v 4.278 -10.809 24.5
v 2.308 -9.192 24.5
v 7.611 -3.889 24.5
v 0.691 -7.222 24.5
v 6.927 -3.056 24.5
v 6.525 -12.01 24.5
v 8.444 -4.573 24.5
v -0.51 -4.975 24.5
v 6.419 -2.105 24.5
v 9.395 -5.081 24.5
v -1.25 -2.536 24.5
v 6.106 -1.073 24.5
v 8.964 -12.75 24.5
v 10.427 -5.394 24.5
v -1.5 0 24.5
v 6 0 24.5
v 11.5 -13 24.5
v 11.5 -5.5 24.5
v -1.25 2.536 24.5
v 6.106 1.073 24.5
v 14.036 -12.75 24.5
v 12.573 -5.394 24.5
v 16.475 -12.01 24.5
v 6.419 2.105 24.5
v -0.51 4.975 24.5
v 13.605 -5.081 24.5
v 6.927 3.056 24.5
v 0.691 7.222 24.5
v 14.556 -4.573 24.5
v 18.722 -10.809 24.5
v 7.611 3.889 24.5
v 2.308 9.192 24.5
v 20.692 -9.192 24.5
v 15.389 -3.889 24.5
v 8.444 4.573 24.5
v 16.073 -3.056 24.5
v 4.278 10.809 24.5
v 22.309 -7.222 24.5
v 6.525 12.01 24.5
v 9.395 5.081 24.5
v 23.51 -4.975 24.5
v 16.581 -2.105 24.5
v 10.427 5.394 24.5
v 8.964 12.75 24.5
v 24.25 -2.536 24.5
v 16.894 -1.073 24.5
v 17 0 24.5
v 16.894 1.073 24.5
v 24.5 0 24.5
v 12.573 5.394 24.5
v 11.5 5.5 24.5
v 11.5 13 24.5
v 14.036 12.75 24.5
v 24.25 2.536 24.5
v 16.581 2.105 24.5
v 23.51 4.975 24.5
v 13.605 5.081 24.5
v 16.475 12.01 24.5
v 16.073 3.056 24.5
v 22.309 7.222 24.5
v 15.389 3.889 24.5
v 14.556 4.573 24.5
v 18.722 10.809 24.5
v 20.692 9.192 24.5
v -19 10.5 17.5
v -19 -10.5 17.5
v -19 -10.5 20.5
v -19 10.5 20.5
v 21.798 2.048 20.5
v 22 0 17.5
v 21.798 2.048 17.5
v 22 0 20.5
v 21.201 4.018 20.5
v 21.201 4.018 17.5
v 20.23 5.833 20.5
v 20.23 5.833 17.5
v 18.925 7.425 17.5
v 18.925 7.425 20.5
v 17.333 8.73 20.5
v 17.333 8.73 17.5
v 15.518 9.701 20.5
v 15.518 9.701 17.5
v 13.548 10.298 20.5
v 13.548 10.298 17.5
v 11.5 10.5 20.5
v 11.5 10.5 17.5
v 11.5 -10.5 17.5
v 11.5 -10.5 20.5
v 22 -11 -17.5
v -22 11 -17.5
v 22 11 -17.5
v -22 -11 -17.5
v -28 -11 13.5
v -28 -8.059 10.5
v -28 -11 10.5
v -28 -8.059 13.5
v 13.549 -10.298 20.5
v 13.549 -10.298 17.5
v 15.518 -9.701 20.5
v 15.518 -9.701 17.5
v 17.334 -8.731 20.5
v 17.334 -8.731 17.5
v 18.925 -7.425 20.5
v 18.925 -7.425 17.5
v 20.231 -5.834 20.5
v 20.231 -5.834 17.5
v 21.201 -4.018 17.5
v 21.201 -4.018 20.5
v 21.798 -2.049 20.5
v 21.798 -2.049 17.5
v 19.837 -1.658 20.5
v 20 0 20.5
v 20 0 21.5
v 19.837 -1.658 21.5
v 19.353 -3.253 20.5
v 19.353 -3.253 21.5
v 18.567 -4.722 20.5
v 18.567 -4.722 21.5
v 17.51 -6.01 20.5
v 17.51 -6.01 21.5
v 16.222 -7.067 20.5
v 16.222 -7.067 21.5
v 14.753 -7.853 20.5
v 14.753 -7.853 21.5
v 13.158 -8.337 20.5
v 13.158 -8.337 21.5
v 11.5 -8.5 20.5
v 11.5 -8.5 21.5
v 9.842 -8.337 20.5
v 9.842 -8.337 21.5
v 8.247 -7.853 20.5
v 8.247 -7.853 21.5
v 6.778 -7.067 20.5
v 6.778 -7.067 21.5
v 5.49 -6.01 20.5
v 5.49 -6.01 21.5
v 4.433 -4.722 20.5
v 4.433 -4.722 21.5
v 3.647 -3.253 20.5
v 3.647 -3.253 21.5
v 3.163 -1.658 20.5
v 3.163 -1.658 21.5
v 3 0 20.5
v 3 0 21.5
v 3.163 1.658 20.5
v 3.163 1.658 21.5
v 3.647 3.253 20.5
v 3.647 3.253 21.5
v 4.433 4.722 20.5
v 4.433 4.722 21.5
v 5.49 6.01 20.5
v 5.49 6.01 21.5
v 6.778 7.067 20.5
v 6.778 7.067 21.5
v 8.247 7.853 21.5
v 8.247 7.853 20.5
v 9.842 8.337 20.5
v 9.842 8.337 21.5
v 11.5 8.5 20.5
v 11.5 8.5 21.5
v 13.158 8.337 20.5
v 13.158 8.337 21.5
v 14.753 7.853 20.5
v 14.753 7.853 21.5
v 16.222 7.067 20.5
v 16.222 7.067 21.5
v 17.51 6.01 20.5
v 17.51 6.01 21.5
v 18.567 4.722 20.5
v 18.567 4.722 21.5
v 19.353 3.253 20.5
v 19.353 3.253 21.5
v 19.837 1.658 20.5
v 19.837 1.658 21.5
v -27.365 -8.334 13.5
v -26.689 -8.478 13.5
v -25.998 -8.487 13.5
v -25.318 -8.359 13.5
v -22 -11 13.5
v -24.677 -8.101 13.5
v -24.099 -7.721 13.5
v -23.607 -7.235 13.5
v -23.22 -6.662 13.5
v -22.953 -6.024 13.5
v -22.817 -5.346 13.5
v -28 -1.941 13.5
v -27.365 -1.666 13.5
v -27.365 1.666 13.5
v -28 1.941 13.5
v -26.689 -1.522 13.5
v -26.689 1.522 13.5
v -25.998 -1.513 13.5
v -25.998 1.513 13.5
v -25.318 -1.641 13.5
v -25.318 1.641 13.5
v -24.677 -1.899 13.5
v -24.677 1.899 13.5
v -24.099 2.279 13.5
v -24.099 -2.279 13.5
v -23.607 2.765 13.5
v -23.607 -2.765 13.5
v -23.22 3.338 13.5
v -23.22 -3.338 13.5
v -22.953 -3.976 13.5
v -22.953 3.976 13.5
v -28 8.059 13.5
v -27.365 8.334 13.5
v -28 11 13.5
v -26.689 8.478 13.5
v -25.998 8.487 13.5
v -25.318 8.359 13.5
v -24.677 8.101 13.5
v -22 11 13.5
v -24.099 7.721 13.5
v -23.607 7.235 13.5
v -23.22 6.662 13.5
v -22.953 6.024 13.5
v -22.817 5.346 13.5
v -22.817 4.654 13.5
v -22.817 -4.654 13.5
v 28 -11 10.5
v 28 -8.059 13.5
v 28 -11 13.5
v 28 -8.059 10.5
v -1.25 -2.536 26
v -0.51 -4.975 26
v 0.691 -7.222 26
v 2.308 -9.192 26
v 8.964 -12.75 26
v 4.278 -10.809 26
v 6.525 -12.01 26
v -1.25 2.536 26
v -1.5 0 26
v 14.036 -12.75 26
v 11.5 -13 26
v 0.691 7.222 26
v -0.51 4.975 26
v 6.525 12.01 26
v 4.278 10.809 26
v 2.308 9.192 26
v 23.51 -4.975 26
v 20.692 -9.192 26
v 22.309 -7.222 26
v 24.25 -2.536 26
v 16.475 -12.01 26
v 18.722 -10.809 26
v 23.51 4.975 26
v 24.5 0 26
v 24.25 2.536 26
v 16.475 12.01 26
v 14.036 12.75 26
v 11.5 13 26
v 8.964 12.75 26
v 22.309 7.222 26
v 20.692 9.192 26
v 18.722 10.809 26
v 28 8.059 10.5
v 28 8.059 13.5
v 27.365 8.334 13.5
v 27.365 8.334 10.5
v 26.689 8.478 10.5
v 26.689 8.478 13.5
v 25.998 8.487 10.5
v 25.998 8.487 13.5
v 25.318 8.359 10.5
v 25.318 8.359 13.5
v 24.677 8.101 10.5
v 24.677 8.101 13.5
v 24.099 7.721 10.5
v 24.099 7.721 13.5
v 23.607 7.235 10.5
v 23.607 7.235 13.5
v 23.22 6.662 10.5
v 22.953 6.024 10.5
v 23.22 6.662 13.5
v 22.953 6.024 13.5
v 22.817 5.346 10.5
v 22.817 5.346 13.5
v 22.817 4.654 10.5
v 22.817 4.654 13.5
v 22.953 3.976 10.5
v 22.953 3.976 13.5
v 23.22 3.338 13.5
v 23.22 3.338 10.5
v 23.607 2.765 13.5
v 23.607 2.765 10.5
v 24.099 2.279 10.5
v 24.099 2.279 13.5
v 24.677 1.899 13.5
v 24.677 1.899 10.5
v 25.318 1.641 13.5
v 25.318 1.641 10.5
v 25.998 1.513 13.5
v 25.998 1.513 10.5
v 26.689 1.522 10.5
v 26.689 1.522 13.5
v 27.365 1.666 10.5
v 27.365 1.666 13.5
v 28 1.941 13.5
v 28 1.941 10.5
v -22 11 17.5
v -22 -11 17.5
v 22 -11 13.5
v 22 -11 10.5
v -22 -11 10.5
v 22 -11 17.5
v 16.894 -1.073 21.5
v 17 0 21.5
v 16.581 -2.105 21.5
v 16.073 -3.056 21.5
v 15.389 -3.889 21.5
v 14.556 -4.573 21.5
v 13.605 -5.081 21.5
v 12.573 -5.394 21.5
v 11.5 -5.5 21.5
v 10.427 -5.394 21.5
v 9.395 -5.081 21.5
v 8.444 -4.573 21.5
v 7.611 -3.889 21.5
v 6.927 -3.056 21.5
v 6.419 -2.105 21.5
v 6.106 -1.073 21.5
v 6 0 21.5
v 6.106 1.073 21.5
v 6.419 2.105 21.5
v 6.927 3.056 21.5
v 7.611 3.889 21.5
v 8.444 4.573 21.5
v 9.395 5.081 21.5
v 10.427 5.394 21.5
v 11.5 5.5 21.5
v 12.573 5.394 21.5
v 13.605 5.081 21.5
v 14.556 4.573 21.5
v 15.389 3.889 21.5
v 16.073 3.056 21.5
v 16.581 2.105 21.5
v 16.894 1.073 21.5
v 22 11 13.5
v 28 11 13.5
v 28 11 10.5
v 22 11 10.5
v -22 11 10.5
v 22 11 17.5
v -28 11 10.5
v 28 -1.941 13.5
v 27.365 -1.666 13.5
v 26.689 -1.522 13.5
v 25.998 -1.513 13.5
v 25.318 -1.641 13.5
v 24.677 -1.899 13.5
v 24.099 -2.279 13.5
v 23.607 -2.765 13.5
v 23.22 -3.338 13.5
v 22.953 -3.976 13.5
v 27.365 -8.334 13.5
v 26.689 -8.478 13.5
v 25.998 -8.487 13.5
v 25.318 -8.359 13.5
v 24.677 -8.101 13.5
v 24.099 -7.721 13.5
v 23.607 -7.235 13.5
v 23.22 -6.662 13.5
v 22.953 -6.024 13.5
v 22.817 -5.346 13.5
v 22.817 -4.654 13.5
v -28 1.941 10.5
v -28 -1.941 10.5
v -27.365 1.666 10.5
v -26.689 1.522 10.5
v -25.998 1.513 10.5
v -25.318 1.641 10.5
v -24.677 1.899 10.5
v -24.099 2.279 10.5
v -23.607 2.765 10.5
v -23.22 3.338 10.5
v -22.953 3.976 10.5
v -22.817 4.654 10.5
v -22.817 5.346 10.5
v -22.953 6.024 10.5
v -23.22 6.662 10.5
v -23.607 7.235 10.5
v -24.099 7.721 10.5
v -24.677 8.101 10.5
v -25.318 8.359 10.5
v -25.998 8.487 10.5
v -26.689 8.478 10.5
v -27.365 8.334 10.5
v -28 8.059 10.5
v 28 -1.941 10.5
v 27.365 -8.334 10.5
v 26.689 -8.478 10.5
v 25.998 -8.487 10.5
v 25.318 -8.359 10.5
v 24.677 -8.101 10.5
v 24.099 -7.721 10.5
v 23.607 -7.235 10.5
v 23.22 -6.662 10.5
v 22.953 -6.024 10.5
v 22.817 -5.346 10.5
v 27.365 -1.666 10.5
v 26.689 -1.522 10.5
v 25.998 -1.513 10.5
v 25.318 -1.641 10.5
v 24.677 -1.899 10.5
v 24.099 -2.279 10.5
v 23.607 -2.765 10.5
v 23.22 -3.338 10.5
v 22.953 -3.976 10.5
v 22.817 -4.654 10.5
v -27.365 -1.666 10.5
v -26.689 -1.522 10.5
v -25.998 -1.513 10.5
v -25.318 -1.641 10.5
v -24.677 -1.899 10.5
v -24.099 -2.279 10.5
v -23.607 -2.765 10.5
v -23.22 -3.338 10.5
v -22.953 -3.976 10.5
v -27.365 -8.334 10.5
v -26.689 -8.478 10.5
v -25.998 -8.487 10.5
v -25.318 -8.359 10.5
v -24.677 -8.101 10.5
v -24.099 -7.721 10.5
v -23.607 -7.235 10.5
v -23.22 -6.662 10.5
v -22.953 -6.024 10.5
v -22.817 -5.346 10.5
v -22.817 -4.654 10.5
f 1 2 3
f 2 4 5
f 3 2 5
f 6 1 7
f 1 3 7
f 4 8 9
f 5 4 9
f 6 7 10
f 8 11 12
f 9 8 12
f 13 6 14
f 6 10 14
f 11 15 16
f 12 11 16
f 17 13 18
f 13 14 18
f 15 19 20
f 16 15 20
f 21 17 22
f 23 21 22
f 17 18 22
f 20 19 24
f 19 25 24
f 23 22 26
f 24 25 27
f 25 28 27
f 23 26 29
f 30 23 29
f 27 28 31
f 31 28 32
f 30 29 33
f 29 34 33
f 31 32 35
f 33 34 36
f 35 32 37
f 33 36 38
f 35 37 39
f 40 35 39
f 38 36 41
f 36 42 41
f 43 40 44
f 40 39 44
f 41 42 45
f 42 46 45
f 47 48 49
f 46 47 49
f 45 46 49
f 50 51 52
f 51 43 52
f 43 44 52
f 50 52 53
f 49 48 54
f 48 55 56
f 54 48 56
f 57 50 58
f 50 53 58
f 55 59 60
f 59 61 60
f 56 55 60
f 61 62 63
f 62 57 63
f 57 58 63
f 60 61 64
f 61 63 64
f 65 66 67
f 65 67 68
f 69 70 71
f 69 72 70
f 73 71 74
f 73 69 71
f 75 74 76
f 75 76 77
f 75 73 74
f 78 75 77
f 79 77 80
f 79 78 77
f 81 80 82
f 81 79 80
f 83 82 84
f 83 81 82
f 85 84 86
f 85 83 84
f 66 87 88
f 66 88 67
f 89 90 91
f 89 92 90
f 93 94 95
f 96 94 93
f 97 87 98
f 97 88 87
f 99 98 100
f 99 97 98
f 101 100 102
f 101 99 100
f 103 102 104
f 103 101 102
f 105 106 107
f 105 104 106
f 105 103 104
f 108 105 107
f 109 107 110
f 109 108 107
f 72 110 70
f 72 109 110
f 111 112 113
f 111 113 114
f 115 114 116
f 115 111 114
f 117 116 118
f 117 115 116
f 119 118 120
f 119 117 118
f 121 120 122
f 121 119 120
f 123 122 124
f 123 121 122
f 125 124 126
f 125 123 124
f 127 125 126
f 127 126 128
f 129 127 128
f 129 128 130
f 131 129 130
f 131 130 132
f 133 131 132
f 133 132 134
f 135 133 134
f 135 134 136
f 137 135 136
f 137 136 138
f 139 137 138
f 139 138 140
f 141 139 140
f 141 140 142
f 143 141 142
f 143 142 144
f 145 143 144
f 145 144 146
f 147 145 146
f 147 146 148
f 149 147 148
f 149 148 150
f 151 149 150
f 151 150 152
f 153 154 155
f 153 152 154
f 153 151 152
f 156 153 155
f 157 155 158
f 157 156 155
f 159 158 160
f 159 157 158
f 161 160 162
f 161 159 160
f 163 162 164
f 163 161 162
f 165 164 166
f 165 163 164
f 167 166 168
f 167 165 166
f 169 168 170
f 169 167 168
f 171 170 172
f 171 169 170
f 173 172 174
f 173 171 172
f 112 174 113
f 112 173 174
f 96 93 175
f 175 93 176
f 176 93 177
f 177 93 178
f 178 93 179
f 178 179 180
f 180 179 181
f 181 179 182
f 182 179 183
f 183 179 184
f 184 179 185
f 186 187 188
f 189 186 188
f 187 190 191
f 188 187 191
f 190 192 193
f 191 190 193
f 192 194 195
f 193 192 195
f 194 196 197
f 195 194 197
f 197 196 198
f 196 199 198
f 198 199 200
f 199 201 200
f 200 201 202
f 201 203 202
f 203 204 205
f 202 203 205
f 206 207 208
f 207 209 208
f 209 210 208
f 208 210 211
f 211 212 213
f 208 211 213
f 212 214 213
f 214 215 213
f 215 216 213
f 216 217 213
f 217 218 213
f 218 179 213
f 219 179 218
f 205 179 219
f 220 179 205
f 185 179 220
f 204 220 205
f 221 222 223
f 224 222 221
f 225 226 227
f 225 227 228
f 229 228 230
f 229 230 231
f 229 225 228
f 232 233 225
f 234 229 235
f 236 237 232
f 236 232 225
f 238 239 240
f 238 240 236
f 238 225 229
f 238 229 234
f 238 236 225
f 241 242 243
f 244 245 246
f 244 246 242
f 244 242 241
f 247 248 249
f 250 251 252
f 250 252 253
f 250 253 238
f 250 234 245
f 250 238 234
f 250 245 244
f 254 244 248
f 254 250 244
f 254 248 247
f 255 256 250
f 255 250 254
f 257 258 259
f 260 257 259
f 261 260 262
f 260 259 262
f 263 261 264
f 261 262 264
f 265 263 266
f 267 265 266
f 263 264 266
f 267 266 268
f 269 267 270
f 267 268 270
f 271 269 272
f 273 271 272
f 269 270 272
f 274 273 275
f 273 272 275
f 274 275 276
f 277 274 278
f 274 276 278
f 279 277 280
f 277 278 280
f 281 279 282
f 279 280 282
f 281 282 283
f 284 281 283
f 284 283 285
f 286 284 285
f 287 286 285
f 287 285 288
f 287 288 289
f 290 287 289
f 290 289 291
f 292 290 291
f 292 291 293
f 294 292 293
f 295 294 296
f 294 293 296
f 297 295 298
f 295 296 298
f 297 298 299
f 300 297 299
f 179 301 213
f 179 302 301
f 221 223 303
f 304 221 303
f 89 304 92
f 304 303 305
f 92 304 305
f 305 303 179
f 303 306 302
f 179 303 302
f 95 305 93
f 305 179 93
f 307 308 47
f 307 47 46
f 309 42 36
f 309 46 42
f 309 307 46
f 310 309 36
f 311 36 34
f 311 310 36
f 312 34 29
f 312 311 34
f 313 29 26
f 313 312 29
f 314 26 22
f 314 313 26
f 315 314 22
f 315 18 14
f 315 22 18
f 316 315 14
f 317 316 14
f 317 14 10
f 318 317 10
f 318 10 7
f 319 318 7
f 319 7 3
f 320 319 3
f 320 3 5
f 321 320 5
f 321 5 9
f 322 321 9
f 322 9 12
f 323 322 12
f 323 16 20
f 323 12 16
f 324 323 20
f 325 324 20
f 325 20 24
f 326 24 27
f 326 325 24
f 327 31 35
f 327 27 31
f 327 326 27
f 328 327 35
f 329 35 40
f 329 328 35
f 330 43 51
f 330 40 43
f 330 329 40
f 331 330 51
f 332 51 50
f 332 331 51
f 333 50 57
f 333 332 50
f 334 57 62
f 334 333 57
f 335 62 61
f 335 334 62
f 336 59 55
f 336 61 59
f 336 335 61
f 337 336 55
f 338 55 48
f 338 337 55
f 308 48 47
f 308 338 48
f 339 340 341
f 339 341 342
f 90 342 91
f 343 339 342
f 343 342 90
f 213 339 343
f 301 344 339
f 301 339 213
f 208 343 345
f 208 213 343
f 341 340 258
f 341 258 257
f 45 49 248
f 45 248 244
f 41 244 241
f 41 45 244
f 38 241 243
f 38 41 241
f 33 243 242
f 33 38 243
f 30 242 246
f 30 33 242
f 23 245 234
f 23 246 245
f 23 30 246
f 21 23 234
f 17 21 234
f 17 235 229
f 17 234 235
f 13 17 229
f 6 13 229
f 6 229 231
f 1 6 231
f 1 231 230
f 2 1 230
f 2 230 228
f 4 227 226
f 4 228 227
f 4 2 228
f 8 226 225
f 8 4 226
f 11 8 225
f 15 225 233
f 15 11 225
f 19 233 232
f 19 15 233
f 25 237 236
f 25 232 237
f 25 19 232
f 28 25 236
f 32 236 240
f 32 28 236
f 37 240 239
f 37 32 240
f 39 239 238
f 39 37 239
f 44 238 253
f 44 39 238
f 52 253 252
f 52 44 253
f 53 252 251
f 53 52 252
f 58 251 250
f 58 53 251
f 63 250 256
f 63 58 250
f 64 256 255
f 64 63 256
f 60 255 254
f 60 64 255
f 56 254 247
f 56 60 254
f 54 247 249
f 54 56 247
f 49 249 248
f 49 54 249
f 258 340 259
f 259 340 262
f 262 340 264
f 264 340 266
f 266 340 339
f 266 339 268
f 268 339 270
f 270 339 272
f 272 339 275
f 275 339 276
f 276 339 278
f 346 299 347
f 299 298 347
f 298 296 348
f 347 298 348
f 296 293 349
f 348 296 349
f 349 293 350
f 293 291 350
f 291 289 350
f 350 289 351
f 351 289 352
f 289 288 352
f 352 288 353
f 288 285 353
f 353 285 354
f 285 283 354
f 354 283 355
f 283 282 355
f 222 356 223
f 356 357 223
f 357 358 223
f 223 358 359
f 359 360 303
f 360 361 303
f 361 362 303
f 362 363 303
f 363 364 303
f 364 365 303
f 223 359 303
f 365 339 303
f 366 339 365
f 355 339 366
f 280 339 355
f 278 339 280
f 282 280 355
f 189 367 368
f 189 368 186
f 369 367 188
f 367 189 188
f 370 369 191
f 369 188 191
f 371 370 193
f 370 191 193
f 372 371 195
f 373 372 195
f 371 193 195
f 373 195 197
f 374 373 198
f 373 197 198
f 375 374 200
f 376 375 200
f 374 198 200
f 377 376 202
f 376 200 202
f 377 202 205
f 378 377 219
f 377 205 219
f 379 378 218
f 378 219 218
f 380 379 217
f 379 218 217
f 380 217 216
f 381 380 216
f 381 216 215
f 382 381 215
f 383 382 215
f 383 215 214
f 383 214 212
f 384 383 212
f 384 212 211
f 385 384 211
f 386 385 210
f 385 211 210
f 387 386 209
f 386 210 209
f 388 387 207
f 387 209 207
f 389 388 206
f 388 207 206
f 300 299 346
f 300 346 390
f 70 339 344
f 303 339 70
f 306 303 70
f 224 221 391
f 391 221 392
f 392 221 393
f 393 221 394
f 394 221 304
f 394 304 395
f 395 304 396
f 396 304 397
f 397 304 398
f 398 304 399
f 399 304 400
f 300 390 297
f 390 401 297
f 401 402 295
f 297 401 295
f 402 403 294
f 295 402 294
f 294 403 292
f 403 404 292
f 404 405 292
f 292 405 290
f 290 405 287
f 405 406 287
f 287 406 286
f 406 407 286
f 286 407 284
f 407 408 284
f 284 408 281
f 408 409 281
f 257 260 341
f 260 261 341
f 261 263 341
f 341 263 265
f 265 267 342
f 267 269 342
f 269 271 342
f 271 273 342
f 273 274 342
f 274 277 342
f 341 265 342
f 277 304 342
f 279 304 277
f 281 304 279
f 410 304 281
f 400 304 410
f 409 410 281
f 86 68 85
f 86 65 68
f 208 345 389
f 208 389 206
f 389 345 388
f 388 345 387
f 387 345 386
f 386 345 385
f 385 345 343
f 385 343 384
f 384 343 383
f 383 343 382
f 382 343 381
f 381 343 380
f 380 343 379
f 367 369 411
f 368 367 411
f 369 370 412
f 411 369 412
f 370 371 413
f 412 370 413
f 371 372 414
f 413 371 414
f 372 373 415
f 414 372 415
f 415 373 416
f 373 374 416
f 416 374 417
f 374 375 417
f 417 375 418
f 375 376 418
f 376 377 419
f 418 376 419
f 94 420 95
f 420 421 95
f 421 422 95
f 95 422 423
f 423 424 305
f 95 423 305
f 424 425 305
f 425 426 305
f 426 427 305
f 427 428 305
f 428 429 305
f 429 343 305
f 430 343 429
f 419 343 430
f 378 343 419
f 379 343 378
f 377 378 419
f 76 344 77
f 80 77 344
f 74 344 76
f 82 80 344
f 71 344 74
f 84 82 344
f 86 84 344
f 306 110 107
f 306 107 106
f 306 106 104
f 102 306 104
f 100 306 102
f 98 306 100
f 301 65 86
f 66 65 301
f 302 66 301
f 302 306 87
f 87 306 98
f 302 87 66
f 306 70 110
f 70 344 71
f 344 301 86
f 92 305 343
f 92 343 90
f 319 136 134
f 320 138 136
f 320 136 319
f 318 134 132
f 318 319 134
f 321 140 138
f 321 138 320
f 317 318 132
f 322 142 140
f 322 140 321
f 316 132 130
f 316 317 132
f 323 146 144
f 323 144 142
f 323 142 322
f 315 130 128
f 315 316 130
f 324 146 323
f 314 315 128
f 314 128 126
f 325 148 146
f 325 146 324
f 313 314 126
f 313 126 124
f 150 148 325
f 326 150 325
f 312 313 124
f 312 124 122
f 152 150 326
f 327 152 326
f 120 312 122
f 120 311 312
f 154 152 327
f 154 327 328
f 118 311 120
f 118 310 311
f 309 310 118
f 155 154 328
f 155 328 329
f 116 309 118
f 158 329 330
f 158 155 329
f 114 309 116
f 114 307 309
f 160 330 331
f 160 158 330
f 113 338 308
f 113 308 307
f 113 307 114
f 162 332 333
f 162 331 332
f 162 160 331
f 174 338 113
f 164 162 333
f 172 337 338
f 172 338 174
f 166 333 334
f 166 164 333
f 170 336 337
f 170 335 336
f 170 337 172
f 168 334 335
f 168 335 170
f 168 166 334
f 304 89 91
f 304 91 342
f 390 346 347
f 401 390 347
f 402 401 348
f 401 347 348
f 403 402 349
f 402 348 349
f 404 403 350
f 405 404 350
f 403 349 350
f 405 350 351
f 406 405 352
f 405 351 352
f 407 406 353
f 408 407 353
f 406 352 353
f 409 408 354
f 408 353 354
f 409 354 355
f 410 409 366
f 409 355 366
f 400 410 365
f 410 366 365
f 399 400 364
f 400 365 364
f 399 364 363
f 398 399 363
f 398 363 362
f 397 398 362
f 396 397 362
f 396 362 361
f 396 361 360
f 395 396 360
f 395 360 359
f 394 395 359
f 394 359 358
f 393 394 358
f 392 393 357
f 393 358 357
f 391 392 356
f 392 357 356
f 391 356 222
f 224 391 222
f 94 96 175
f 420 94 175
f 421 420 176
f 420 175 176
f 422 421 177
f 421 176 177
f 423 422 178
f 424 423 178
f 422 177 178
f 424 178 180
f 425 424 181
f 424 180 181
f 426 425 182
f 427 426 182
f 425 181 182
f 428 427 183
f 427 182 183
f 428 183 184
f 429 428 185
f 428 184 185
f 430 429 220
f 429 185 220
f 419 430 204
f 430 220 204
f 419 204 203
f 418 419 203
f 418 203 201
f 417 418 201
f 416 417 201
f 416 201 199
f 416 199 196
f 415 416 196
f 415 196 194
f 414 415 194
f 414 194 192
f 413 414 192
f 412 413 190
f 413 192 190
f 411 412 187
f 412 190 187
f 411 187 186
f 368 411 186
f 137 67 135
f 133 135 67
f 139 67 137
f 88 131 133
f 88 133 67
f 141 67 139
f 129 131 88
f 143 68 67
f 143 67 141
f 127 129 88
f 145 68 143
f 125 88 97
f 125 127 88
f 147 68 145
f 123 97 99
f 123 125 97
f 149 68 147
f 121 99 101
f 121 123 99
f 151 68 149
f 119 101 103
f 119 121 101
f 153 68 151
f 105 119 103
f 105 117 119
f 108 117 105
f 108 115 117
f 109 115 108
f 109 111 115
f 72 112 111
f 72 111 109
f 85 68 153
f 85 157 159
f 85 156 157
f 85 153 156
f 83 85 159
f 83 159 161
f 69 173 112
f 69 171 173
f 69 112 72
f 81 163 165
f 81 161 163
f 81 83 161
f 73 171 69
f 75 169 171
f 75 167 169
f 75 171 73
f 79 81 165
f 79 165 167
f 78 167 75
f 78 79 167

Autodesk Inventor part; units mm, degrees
ref_plane "YZ Plane" through (0, 0, 0) normal (1, 0, 0) x (0, 1, 0)
ref_plane "XZ Plane" through (0, 0, 0) normal (0, 1, 0) x (-1, 0, 0)
ref_plane "XY Plane" through (0, 0, 0) normal (0, 0, 1) x (1, 0, 0)
sketch "Sketch1" plane through (0, 0, 0) normal (0, 1, 0) x (-1, 0, 0)
  line L0 (-22, 17.5) -> (22, 17.5)
  line L1 (22, 17.5) -> (22, -17.5)
  line L2 (22, -17.5) -> (-22, -17.5)
  line L3 (-22, -17.5) -> (-22, 17.5)
  line L4 (-22, 17.5) -> (22, -17.5) construction
  line L5 (22, 17.5) -> (-22, -17.5) construction
  point P0 (0, 0)
  dimension "d0" = 44
  dimension "d1" = 35
extrude "Extrusion1" add sketch "Sketch1" along normal mid plane 22
sketch "Sketch2" plane through (-22, 11, 17.5) normal (0, 0, 1) x (1, 0, 0)
  line L0 (3, -0.5) -> (44, -0.5)
  line L1 (44, -0.5) -> (44, -21.5)
  line L2 (44, -21.5) -> (3, -21.5)
  line L3 (3, -21.5) -> (3, -0.5)
  line L4 (0, 0) -> (0, -22) projected
  line L5 (44, 0) -> (0, 0) projected
  line L6 (0, -22) -> (44, -22) projected
  line L7 (44, 0) -> (44, -22) projected
  point P0 (22, -11)
  dimension "d4" = 3
  dimension "d5" = 0.5
  dimension "d6" = 0.5
  dimension "d7" = 0
extrude "Extrusion2" add sketch "Sketch2" along normal blind 3 contours L0 L1 L2 L3
fillet "Fillet1" radius 10.5 1 edges at (22, 10.5, 19)
fillet "Fillet2" radius 10.5 1 edges at (22, -10.5, 19)
sketch "Sketch3" plane through (-22, 11, 20.5) normal (0, 0, 1) x (1, 0, 0)
  circle A0 centre (33.5, -11) radius 8.5
  arc A1 (33.5, -21.5) -> (33.5, -0.5) centre (33.5, -11) ccw projected
  point P0 (22, -11)
  dimension "d13" = 2
extrude "Extrusion3" add sketch "Sketch3" along normal blind 1
sketch "Sketch4" plane through (11.5, 0, 21.5) normal (0, 0, 1) x (1, 0, 0)
  circle A0 centre (0, 0) radius 5.5
  circle A1 centre (0, 0) radius 8.5 projected
  point P0 (-11.5, 0)
  dimension "d16" = 3
extrude "Extrusion4" add sketch "Sketch4" along normal blind 3 contours A0
sketch "Sketch5" plane through (11.5, 0, 24.5) normal (0, 0, 1) x (1, 0, 0)
  circle A0 centre (0, 0) radius 13
  point P0 (-11.5, 0)
  dimension "d19" = 26
extrude "Extrusion5" add sketch "Sketch5" along normal blind 1.5
sketch "Sketch7" plane through (-22, -11, 17.5) normal (-1, 0, 0) x (0, 0, 1)
  line L0 (-4, 22) -> (-7, 22)
  line L1 (-7, 22) -> (-7, 0)
  line L2 (-7, 0) -> (-4, 0)
  line L3 (-4, 0) -> (-4, 22)
  line L4 (0, 22) -> (0, 0) projected
  line L5 (-35, 22) -> (0, 22) projected
  line L6 (-35, 0) -> (0, 0) projected
  point P0 (-17.5, 11)
  dimension "d22" = 4
  dimension "d23" = 3
  dimension "d24" = 0
  dimension "d25" = 0
extrude "Extrusion6" add sketch "Sketch7" along normal blind 6 contours L3 L2 L1 L0
sketch "Sketch8" plane through (-22, -11, 13.5) normal (0, 0, 1) x (1, 0, 0)
  circle A0 centre (-4.3, 16) radius 3.5
  circle A1 centre (-4.3, 6) radius 3.5
  line L0 (0, 0) -> (-6, 0) projected
  line L1 (0, 22) -> (-6, 22) projected
  line L2 (-6, 0) -> (-6, 22) projected
  point P0 (22, 11)
  dimension "d28" = 7
  dimension "d29" = 6
  dimension "d30" = 7
  dimension "d31" = 6
  dimension "d32" = 1.7
  dimension "d33" = 1.7
extrude "Extrusion7" cut sketch "Sketch8" against normal through all
mirror "Mirror1" about plane through (0, 0, 0) normal (1, 0, 0) of "Extrusion6", "Extrusion7"
properties part number "servo"
